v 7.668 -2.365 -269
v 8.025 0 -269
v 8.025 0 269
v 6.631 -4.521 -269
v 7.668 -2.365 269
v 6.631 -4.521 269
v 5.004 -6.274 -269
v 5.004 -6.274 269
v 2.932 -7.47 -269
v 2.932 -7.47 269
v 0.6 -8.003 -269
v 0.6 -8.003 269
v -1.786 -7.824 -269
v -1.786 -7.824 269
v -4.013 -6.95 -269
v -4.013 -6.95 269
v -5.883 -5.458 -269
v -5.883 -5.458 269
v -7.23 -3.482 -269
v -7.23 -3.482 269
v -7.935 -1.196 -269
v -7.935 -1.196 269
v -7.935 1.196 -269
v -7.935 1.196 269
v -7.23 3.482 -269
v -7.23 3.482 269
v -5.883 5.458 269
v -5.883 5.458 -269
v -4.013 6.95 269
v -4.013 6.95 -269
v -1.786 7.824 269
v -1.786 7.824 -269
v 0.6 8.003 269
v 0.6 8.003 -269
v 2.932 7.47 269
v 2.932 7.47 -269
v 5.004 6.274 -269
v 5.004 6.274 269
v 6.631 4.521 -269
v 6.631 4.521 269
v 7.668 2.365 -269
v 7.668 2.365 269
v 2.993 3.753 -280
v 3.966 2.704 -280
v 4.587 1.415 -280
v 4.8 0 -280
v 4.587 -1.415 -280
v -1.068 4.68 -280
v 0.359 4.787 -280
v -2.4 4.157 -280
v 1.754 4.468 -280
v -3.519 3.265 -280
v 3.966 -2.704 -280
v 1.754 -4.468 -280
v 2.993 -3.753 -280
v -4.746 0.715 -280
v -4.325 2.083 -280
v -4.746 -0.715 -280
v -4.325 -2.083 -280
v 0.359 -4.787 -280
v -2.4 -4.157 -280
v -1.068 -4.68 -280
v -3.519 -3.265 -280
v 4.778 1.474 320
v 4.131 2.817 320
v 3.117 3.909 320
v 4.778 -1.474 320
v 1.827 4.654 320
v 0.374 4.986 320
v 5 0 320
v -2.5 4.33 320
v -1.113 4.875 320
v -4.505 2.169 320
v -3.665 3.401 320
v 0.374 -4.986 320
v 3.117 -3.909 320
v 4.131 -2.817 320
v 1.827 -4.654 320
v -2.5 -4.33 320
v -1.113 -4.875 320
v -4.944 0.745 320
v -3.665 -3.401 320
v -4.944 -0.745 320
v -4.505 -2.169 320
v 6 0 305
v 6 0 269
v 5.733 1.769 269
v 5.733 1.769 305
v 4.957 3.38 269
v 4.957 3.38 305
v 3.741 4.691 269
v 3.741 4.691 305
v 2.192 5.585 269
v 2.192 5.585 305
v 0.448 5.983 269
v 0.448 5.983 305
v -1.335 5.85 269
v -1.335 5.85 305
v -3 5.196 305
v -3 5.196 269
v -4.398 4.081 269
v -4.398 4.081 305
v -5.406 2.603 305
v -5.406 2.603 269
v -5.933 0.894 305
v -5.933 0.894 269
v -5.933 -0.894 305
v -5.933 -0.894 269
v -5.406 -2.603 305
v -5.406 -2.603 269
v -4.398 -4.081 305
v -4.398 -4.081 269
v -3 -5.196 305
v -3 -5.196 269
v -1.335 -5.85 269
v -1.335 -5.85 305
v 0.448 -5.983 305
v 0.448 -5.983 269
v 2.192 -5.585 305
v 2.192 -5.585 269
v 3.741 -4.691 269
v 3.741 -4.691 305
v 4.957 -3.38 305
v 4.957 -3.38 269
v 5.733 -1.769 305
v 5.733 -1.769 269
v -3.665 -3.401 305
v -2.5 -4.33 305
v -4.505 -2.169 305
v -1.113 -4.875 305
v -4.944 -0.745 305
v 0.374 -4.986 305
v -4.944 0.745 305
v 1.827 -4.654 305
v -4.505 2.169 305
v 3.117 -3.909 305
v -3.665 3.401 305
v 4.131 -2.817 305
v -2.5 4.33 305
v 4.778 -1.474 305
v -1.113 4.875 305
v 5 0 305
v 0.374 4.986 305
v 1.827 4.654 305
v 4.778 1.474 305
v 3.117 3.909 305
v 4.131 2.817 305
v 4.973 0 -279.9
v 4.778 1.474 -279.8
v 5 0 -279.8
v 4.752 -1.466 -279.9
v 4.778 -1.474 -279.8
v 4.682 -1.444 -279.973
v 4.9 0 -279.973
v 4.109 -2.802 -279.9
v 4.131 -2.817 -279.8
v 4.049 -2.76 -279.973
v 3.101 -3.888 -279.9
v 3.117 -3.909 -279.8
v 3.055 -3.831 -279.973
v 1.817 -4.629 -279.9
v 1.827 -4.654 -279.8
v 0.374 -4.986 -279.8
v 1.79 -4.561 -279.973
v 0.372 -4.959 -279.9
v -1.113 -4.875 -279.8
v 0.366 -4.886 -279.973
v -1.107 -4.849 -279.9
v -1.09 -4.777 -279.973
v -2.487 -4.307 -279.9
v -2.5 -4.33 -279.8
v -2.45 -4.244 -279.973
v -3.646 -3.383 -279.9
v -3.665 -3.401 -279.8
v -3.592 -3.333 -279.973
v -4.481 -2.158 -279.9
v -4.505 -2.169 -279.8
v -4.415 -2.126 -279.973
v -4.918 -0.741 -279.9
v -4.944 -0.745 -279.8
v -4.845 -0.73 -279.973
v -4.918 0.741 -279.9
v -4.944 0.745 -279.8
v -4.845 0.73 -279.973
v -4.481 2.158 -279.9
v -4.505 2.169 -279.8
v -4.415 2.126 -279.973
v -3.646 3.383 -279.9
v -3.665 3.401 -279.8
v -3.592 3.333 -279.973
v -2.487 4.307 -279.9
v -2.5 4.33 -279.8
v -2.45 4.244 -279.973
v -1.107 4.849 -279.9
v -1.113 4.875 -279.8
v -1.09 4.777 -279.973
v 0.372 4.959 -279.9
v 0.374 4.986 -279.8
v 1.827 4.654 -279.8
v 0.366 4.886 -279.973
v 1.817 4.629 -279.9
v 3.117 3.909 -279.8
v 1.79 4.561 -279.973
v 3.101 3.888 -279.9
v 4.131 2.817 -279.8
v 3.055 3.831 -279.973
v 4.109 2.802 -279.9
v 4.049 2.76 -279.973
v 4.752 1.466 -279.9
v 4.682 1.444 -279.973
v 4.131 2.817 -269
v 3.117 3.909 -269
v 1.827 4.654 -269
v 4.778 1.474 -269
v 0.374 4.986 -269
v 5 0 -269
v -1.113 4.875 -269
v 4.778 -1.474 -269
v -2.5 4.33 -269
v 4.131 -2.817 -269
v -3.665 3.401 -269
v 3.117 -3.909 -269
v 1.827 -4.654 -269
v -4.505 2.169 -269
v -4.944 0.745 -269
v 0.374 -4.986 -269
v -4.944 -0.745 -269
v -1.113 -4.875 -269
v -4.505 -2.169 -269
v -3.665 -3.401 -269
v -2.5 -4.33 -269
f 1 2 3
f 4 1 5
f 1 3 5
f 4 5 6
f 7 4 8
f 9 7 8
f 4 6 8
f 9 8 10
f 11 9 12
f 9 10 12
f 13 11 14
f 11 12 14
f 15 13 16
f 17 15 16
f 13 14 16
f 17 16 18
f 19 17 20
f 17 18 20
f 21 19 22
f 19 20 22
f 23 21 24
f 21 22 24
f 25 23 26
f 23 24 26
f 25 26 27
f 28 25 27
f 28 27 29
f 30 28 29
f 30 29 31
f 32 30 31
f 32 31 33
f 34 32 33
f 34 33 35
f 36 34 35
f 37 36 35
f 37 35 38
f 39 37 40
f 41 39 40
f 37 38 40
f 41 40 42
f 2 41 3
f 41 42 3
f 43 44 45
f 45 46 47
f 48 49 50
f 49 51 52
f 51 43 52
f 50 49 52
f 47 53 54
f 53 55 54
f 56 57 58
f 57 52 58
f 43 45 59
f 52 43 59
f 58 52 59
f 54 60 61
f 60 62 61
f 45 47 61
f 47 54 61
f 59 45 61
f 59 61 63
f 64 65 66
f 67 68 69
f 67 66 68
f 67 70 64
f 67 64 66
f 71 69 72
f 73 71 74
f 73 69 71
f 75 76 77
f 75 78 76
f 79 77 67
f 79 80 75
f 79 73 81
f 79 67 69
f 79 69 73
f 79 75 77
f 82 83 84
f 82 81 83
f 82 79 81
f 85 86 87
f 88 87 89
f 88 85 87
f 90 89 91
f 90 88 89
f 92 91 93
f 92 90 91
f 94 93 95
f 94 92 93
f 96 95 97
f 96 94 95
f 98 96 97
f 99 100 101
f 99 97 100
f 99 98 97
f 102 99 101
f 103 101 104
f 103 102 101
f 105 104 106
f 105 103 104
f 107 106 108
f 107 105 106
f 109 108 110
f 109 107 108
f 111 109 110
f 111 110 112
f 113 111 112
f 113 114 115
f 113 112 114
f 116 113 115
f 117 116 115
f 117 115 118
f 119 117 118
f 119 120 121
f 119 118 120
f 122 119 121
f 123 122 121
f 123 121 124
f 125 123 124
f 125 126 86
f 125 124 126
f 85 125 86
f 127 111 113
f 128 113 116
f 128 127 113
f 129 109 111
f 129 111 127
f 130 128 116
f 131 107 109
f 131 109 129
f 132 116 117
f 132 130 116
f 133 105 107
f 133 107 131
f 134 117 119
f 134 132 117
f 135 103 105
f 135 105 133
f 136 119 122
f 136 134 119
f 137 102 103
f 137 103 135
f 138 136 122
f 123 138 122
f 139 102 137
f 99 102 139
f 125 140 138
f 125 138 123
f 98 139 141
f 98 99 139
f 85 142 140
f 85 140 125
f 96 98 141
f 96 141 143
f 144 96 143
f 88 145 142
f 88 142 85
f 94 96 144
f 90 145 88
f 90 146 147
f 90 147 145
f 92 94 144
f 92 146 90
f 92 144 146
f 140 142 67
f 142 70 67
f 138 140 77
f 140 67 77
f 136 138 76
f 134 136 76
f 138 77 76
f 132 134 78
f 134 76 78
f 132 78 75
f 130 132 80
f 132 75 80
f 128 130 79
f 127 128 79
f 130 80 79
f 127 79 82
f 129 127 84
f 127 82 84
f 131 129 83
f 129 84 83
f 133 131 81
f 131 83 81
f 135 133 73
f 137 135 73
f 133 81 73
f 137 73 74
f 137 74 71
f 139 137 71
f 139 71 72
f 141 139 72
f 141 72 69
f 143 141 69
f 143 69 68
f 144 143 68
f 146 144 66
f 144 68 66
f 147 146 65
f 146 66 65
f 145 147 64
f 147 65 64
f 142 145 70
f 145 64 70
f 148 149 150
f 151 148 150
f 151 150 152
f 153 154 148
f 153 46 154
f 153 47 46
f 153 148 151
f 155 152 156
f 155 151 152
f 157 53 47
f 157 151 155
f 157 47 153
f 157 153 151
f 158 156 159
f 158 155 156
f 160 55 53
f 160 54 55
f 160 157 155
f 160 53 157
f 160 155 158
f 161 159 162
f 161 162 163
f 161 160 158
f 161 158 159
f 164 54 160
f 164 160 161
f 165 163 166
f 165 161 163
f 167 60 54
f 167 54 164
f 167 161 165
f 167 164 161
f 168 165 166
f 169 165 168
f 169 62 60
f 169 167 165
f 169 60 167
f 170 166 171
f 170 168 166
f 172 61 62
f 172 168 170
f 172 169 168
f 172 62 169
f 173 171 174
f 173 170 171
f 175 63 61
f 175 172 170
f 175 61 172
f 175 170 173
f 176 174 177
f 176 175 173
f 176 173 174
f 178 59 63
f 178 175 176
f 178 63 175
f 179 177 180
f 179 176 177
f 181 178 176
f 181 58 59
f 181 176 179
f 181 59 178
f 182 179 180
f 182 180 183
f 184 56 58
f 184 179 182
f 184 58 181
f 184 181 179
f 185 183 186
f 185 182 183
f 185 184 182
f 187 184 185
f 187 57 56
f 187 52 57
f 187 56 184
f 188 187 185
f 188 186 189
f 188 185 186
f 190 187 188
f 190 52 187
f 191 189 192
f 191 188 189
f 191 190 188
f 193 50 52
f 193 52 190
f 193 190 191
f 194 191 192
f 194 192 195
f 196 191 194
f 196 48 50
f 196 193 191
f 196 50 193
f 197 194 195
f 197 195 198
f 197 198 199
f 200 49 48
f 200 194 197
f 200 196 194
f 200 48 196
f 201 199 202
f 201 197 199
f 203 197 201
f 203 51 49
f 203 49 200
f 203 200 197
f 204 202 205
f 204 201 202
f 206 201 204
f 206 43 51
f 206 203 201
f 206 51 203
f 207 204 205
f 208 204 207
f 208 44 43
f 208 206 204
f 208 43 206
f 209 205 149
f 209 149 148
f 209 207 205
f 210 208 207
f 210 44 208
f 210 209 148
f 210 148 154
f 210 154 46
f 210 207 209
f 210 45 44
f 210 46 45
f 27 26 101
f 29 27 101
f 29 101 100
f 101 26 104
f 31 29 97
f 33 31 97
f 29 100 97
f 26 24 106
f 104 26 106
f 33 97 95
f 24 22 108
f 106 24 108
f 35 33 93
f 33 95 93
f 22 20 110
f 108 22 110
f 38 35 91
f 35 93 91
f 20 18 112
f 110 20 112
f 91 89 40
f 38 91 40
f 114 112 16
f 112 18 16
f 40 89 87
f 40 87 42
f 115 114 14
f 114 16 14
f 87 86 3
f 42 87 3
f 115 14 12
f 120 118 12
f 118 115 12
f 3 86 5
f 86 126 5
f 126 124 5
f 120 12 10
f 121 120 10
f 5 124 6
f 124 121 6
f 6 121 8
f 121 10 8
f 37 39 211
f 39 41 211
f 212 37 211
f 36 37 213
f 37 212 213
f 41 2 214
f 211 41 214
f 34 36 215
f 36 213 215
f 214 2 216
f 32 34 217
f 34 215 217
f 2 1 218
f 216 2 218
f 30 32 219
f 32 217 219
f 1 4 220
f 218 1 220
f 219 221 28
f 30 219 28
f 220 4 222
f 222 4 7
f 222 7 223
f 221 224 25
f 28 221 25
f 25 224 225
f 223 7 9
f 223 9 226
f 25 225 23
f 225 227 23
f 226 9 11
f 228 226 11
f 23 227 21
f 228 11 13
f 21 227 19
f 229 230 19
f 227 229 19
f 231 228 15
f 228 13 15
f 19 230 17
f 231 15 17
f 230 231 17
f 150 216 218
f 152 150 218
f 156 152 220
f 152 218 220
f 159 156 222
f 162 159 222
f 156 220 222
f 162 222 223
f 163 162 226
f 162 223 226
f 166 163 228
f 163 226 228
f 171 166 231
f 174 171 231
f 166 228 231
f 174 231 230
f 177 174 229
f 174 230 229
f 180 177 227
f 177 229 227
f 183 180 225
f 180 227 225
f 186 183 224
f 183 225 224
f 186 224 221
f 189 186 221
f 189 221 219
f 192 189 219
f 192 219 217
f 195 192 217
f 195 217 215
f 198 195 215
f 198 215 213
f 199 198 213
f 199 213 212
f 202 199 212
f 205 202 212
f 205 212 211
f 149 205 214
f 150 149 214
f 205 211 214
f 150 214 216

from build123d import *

# Parameters (mm, degrees)
F0_W   = 5
F0_H   = 15
F0_W_2 = 6
F0_H_2 = 22
F0_H_3 = 11
F3_R   = 0.2


# Not quite as in the source:
# - the program builds the solid bodies; features that only make, move or delete a surface that nothing else refers to are left out


with BuildPart() as f1:
    # F0 (on Front) → F1 (revolve)
    with BuildSketch(Plane.XZ):
        with Locations((2.5, 312.5)):
            Rectangle(F0_W, F0_H)
    revolve(axis=Axis((0, 0, -110.3163262457), (0, 0, -1)))



with BuildPart() as f1b:
    # F0 (on Front) → F1, piece 2 (revolve)
    with BuildSketch(Plane.XZ):
        with Locations((3, 280)):
            Rectangle(F0_W_2, F0_H_2)
        Polygon((0, 269), (0, 59.3673475087), (0, -269), (5, -269), (8.025, -269), (8.025, 269), (6, 269), align=None)
        with Locations((2.5, -274.5)):
            Rectangle(F0_W, F0_H_3)
    revolve(axis=Axis((0, 0, -110.3163262457), (0, 0, -1)))


with BuildPart() as f1_1:
    add(f1.part)

    add(f1b.part)  # F2 merges F1b
    # F0 (on Front) → F2 (revolve)
    with BuildSketch(Plane.XZ):
        Polygon((0, 305), (0, 291), (6, 291), (6, 305), (5, 305), align=None)
    revolve(axis=Axis((0, 0, 189.6836737543), (0, 0, 1)))

    # F3
    f3_edges = [f1_1.edges().sort_by_distance(p)[0] for p in [
        (-5, 0, -280),
    ]]
    fillet(f3_edges, radius=F3_R)


solid = f1_1.part
